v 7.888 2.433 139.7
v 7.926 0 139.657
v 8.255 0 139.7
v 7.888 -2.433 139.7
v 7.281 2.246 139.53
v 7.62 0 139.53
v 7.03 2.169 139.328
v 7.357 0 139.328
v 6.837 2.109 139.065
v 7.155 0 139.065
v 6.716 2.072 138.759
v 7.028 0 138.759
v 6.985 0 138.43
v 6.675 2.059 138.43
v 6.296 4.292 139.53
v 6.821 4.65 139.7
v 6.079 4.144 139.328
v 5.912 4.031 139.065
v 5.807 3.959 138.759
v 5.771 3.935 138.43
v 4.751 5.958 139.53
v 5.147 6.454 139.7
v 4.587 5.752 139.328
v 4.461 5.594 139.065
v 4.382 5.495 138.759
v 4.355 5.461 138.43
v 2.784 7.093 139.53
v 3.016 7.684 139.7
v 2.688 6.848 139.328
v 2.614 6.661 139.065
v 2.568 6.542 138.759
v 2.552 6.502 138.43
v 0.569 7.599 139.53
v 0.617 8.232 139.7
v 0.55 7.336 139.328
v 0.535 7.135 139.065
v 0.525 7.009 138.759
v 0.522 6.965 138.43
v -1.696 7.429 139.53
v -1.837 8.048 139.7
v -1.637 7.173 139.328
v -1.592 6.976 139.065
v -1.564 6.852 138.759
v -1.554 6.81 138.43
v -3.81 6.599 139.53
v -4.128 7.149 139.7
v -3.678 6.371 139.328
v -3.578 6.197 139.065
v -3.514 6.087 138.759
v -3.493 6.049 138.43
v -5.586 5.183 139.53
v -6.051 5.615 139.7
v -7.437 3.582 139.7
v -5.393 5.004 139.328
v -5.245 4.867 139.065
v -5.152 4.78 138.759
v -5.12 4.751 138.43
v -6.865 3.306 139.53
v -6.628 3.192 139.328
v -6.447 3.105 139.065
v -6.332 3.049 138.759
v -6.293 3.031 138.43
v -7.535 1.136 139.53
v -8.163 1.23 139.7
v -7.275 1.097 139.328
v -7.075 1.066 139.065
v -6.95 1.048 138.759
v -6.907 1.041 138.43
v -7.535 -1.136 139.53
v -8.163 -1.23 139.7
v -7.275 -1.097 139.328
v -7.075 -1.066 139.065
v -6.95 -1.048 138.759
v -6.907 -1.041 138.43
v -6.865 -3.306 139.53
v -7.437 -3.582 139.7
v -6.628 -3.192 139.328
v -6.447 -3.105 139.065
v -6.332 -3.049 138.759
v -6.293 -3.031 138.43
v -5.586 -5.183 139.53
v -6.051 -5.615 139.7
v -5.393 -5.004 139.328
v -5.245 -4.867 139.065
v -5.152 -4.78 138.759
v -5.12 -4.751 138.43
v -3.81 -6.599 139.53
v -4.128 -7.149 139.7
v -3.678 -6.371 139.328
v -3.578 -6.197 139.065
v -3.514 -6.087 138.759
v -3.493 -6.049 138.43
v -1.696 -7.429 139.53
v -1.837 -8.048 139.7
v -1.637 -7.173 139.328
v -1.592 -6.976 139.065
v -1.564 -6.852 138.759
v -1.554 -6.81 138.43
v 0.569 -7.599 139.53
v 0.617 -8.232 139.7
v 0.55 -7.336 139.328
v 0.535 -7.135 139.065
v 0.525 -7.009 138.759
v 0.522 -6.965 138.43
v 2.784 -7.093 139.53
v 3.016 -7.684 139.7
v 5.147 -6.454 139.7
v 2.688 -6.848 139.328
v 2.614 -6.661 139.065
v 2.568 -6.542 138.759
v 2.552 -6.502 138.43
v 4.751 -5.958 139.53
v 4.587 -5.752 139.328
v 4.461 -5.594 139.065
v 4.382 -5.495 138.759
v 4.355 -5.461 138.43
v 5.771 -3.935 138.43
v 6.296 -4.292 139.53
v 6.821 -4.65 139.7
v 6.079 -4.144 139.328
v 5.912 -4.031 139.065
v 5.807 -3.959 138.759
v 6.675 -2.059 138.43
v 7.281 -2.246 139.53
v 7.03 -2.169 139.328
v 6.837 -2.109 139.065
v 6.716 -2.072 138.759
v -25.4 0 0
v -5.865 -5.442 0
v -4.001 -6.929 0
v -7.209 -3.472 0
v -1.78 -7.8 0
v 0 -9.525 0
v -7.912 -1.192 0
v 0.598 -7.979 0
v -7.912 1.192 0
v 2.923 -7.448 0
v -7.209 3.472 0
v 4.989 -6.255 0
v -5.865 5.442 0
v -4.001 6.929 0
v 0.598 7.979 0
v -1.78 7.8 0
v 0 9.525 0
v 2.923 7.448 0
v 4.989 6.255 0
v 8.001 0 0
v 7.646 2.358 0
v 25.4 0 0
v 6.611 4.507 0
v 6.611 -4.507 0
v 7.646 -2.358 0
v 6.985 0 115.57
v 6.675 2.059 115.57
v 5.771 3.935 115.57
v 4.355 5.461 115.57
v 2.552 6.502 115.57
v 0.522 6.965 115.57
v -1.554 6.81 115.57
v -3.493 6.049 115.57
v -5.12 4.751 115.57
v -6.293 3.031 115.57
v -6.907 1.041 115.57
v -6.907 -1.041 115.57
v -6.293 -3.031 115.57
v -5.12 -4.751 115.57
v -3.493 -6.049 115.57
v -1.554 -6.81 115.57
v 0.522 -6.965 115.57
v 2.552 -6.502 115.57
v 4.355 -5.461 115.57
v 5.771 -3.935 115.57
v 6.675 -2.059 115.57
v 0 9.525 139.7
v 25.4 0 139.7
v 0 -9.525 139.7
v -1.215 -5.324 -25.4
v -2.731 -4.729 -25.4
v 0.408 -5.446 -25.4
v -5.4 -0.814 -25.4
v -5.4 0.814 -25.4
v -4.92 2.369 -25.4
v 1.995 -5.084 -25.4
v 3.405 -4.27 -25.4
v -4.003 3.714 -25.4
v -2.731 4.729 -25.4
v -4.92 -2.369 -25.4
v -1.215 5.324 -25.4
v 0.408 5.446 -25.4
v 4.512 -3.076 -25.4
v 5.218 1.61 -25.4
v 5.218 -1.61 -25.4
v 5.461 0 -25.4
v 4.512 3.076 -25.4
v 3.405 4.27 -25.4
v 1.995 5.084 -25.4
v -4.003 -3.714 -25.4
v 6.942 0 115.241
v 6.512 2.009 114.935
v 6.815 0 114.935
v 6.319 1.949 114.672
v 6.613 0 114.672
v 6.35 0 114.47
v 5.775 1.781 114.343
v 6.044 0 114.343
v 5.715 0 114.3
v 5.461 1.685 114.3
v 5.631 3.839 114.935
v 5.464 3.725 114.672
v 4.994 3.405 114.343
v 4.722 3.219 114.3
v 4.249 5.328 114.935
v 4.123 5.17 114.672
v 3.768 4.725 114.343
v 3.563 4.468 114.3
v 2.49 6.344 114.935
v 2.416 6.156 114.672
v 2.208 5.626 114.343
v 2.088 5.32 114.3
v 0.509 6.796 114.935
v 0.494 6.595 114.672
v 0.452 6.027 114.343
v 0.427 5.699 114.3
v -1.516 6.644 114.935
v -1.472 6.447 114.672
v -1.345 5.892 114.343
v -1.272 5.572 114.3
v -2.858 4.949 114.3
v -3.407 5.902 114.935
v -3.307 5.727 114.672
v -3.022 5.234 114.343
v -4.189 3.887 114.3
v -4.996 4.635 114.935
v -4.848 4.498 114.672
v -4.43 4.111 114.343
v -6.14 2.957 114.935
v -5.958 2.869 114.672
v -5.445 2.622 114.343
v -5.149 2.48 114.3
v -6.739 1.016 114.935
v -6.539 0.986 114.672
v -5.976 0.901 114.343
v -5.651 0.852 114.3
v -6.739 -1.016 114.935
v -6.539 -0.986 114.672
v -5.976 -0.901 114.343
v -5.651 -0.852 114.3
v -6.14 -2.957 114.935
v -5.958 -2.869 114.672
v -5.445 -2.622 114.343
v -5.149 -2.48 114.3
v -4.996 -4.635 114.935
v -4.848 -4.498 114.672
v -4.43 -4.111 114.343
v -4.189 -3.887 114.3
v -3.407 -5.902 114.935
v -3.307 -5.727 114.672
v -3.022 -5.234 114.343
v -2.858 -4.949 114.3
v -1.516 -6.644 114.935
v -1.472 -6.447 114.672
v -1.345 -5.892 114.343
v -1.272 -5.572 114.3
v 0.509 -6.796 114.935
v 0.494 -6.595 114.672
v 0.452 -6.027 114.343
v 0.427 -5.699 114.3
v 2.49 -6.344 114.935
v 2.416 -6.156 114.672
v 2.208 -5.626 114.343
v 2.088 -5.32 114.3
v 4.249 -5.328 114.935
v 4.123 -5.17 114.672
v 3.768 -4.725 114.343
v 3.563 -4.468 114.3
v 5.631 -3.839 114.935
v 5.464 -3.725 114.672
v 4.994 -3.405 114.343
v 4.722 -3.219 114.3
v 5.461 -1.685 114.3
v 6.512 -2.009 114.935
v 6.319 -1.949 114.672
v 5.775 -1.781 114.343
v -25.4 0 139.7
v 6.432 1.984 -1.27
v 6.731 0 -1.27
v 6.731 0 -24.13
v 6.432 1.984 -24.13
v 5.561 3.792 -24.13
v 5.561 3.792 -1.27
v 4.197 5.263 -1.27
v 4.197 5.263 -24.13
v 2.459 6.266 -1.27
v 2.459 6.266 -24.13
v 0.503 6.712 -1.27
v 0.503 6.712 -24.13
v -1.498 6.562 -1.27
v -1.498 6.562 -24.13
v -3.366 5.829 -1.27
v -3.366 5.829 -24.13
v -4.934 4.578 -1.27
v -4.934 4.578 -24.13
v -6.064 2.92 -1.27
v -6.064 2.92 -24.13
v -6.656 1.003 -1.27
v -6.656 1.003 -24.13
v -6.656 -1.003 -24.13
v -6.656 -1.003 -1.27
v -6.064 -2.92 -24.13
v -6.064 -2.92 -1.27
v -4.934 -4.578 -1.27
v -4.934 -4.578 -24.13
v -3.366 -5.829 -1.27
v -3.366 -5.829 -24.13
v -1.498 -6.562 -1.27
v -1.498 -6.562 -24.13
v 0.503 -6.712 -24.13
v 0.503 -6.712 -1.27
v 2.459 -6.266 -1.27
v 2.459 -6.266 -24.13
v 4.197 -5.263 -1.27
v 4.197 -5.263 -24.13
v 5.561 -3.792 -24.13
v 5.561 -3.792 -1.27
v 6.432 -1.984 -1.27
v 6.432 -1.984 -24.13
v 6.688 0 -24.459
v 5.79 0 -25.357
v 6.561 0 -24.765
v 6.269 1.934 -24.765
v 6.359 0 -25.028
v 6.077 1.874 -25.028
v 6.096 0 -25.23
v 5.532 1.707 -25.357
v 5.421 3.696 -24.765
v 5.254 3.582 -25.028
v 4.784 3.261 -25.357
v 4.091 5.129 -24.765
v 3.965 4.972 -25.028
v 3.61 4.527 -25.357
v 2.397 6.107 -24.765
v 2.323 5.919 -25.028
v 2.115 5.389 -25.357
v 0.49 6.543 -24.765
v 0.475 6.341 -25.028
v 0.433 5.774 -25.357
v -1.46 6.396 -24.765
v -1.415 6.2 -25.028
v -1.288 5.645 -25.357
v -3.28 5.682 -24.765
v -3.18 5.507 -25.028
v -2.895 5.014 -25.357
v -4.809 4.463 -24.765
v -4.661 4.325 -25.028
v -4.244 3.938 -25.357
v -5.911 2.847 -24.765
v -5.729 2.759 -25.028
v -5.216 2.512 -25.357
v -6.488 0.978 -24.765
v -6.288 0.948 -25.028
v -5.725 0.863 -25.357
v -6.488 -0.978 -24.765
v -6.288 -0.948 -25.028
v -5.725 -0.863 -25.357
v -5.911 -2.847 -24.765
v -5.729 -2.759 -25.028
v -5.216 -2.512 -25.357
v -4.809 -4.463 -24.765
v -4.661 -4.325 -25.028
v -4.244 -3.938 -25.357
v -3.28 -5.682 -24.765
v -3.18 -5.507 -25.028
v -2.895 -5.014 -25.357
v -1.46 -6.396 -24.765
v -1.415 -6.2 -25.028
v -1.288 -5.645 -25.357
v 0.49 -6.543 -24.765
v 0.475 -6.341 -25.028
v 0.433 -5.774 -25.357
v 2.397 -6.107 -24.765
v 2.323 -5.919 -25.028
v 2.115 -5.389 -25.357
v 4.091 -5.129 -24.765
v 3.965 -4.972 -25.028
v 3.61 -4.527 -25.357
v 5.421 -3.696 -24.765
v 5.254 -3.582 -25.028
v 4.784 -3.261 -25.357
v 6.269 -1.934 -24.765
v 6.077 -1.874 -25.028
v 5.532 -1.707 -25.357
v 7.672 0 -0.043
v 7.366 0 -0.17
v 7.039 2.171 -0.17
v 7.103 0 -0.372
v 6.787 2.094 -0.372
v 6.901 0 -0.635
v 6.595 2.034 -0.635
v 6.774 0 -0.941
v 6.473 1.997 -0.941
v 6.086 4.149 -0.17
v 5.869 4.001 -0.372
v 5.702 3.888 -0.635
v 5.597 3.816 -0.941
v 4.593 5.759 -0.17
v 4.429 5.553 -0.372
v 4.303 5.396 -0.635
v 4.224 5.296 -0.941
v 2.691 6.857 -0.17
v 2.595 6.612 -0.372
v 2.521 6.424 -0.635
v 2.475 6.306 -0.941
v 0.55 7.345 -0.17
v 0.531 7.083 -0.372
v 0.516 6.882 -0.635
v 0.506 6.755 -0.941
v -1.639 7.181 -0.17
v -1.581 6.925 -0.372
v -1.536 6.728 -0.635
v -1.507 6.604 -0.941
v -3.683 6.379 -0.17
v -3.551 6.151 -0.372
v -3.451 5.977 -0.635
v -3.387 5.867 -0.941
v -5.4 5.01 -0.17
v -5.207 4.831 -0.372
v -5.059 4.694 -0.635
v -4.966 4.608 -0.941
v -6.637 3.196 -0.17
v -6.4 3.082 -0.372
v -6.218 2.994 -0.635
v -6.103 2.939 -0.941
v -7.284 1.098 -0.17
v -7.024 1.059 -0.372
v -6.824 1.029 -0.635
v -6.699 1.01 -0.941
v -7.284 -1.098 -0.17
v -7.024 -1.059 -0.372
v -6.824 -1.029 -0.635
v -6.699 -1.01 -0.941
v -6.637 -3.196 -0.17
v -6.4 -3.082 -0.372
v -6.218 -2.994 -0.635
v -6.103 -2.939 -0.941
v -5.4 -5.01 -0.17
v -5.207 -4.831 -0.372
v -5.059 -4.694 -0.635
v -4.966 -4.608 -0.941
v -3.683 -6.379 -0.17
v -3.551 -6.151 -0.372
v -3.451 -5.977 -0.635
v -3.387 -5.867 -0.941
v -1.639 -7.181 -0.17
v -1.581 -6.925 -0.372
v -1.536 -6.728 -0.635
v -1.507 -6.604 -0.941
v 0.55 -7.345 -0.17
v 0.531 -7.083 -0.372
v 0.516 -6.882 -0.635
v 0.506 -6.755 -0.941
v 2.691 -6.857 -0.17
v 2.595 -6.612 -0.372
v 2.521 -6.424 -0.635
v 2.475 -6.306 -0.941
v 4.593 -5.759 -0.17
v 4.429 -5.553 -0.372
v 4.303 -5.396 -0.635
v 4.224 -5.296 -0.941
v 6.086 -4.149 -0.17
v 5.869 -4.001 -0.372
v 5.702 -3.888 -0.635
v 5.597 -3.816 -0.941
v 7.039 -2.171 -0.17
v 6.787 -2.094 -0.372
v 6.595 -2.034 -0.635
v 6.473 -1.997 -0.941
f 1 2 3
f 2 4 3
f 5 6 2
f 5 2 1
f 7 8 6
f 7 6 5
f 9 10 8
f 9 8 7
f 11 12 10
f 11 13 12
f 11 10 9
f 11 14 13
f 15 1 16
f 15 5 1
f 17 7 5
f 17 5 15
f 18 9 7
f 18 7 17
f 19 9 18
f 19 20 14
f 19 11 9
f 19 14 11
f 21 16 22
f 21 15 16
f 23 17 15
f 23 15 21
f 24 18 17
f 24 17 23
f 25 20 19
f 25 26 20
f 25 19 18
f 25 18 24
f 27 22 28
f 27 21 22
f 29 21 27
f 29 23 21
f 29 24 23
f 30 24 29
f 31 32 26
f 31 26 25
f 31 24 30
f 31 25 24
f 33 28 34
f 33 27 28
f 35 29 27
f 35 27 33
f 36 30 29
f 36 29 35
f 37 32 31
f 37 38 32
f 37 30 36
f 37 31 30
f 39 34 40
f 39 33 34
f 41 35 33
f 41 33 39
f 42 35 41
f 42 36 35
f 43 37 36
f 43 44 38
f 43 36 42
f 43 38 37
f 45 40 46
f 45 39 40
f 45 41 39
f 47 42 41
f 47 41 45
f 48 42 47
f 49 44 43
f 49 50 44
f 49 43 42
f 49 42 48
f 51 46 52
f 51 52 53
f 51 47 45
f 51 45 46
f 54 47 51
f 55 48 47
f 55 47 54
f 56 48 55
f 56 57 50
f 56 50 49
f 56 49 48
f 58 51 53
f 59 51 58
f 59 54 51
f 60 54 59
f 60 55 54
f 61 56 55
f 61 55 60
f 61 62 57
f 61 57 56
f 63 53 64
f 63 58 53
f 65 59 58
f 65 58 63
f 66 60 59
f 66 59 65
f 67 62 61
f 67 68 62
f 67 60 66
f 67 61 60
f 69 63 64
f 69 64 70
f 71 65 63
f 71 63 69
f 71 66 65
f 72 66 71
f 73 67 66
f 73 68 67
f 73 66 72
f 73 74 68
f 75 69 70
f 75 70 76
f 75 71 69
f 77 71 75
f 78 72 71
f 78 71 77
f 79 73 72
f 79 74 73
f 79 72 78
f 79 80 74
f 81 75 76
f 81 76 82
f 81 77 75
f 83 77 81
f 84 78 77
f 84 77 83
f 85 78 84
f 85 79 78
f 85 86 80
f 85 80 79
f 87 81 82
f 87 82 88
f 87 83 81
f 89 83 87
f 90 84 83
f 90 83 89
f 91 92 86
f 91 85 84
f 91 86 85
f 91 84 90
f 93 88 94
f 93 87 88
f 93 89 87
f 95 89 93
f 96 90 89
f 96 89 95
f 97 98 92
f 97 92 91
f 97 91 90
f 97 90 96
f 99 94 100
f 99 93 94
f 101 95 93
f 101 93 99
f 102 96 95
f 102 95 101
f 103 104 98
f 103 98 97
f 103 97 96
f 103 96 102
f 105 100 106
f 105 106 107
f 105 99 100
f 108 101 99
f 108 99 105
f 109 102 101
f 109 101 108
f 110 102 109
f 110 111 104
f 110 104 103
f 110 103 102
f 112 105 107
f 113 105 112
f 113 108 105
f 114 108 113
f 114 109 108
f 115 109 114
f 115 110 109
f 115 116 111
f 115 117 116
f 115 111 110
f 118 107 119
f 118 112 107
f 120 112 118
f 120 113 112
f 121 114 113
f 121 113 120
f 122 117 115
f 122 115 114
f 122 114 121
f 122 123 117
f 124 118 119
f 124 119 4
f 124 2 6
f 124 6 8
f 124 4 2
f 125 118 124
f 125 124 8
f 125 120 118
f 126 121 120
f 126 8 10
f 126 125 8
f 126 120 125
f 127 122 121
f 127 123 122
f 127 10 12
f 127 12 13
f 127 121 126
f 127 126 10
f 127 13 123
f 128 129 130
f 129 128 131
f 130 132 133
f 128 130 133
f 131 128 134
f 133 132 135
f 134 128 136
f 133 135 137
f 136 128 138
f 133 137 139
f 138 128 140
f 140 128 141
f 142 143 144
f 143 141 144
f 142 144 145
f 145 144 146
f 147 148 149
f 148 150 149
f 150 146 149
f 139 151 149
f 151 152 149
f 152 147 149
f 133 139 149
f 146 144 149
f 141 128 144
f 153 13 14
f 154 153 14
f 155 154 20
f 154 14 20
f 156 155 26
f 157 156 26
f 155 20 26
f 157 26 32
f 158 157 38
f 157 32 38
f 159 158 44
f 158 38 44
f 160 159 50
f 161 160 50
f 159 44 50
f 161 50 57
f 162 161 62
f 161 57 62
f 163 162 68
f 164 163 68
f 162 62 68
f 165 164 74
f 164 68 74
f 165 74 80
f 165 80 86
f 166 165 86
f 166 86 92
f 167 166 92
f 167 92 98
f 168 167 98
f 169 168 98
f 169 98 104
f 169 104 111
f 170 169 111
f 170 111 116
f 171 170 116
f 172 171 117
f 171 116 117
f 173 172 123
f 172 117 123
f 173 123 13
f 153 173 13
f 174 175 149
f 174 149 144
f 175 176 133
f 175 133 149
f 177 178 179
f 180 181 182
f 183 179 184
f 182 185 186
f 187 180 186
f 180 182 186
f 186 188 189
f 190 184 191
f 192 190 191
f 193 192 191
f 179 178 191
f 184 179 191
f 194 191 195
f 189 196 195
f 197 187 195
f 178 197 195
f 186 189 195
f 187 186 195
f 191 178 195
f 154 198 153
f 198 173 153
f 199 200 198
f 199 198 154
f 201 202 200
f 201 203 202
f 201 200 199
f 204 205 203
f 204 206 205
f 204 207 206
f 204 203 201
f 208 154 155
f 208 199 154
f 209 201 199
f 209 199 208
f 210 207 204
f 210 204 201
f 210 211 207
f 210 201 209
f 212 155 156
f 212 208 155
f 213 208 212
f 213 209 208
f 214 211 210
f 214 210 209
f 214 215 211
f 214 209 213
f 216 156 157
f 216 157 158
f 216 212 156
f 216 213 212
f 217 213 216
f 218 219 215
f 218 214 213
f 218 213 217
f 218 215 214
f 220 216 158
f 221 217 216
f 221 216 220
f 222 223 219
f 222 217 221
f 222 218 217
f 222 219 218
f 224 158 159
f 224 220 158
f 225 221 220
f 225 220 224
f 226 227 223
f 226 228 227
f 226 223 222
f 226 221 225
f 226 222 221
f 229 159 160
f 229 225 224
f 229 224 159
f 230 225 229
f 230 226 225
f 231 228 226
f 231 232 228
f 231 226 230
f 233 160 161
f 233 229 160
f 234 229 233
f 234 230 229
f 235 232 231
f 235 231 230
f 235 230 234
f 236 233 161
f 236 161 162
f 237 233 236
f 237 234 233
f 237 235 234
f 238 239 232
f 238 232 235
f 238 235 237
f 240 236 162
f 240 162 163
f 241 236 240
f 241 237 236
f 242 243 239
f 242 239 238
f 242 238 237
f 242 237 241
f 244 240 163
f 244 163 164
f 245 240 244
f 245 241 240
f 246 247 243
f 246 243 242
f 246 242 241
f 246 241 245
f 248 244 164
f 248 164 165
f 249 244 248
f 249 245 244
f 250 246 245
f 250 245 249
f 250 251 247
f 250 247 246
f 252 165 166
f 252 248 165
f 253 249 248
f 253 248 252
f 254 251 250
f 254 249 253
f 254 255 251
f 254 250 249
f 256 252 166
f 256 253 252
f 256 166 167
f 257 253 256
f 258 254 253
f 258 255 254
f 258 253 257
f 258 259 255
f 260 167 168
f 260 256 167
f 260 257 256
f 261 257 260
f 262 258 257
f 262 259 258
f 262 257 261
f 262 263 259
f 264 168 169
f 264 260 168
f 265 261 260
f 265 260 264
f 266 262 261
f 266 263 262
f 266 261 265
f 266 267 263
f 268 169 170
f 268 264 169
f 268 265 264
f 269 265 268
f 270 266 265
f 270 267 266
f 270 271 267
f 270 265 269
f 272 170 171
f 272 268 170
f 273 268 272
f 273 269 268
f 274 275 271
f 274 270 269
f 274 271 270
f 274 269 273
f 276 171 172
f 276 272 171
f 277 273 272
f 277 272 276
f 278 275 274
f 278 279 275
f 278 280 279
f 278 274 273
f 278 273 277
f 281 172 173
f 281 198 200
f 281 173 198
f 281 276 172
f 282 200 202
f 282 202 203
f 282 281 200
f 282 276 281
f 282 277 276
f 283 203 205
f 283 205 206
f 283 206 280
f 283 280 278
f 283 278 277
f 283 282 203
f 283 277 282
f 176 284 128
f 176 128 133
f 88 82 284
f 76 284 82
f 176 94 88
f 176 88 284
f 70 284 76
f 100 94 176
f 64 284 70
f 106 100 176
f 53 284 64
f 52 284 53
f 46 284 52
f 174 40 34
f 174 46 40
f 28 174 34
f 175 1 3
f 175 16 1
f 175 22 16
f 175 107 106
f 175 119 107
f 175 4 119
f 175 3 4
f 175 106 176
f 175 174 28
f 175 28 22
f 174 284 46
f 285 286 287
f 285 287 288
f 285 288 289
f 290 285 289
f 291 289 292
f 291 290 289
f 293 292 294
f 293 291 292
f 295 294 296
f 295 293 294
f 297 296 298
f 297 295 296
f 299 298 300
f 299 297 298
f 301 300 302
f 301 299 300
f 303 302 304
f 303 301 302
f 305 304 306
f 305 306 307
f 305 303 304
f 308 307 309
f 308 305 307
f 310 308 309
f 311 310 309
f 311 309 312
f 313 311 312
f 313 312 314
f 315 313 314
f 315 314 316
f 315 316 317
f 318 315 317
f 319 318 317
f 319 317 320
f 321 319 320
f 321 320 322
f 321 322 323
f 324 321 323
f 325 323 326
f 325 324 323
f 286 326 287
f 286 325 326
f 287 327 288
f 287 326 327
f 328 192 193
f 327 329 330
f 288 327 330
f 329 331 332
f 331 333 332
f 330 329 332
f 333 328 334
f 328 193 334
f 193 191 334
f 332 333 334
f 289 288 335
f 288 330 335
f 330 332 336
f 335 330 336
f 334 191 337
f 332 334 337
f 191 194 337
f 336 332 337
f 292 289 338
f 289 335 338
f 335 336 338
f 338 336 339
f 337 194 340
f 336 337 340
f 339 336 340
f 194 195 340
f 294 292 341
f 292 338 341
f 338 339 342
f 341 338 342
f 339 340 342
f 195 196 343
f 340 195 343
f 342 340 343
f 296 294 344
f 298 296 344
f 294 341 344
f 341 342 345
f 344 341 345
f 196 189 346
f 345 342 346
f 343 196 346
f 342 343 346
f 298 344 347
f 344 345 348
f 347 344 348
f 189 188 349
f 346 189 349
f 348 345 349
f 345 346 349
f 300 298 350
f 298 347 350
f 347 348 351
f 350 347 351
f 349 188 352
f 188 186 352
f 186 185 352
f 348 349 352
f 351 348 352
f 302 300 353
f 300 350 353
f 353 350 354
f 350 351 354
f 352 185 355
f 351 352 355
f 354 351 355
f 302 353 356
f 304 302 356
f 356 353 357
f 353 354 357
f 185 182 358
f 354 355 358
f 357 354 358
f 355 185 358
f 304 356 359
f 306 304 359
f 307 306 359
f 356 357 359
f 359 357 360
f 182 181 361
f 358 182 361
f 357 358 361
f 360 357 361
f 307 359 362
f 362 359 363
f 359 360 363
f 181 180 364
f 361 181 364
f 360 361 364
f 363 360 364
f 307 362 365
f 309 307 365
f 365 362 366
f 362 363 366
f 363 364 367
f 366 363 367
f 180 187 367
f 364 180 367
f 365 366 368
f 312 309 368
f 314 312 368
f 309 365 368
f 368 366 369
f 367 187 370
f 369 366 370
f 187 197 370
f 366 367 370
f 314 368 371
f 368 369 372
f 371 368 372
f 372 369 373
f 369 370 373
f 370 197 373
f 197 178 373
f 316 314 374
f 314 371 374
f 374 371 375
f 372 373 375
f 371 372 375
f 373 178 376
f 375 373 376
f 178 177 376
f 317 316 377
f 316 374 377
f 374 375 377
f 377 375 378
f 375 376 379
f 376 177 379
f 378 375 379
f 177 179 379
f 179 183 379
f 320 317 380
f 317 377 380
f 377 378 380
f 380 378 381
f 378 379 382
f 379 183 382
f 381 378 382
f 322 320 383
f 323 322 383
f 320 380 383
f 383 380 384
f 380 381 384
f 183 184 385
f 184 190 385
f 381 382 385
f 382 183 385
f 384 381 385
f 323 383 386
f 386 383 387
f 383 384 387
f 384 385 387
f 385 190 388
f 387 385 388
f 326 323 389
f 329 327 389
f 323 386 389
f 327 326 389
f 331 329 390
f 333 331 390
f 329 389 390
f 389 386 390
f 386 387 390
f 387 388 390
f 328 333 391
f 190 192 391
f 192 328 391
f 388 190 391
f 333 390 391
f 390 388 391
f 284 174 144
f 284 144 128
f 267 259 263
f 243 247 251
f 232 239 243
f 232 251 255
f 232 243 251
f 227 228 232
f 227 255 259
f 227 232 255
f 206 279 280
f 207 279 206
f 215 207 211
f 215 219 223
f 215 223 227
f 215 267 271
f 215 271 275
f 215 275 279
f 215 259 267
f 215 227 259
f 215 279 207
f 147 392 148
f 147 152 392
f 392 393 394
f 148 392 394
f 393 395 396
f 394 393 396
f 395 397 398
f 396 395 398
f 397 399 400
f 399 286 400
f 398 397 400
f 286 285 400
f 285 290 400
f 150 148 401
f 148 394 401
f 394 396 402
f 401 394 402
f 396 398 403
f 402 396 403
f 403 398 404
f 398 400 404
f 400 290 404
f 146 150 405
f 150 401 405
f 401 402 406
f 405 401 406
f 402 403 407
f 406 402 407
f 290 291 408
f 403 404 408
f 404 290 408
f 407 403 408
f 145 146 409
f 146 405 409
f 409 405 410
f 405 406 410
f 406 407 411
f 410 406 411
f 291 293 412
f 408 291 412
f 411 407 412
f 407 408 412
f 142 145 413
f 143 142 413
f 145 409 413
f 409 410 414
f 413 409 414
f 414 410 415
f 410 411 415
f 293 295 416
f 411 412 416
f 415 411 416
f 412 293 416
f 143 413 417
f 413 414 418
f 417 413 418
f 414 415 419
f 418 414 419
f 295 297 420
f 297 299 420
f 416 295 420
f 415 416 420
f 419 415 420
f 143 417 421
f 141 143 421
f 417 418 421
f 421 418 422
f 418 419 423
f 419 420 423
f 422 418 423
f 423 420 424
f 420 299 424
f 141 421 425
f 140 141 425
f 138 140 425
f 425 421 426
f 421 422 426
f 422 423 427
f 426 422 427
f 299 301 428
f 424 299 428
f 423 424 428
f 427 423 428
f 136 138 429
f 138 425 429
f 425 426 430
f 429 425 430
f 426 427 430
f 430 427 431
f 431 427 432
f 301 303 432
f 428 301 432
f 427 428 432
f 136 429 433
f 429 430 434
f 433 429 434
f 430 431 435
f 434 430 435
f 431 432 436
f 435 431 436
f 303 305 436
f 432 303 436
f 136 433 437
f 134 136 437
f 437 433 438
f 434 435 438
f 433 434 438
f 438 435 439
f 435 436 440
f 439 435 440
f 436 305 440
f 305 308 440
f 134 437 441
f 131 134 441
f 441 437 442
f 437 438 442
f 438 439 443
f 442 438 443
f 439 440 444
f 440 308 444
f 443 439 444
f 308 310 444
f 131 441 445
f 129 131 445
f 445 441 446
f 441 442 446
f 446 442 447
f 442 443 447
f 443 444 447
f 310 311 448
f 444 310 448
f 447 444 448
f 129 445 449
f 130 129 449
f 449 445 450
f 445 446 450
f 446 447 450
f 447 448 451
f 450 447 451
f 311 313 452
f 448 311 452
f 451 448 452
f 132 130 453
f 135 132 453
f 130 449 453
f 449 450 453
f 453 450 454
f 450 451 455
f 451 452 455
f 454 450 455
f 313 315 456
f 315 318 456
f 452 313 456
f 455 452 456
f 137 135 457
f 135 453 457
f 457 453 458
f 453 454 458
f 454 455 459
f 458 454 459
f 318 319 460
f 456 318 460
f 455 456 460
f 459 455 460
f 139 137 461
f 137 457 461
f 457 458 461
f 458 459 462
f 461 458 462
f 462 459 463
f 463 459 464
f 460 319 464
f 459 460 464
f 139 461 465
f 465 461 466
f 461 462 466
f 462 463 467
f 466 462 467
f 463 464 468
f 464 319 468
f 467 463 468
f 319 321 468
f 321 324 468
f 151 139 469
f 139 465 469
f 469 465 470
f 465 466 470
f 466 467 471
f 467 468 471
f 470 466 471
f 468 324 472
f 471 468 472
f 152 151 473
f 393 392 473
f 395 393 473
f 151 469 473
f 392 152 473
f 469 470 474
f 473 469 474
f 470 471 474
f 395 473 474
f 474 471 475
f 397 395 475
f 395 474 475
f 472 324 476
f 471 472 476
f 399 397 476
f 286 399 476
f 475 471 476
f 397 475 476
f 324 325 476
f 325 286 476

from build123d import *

# Parameters (mm, degrees)
F1_DEPTH = 139.7
F2_R     = 6.731
F3_DEPTH = 25.4
F4_R     = 6.985
F5_DEPTH = 25.4
F6_R     = 1.27
F7_R     = 1.27


with BuildPart() as f1:
    # F0 (on Top) → F1 (new body)
    with BuildSketch(Plane.XY):
        Polygon((25.4, 0), (0, 9.525), (-25.4, 0), (0, -9.525), align=None)
    extrude(amount=F1_DEPTH)

    # F2 (on Top) → F3 (join)
    with BuildSketch(Plane.XY):
        Circle(F2_R)
    extrude(amount=-F3_DEPTH)

    # F4 (on face) → F5 (cut)
    with BuildSketch(Plane.XY.offset(139.7)):
        Circle(F4_R)
    extrude(amount=-F5_DEPTH, mode=Mode.SUBTRACT)

    # F6
    f6_edges = [f1.edges().sort_by_distance(p)[0] for p in [
        (-6.985, 0, 114.3),
        (-6.985, 0, 139.7),
    ]]
    fillet(f6_edges, radius=F6_R)

    # F7
    f7_edges = [f1.edges().sort_by_distance(p)[0] for p in [
        (-6.731, 0, -25.4),
        (-6.731, 0, 0),
    ]]
    fillet(f7_edges, radius=F7_R)


solid = f1.part
